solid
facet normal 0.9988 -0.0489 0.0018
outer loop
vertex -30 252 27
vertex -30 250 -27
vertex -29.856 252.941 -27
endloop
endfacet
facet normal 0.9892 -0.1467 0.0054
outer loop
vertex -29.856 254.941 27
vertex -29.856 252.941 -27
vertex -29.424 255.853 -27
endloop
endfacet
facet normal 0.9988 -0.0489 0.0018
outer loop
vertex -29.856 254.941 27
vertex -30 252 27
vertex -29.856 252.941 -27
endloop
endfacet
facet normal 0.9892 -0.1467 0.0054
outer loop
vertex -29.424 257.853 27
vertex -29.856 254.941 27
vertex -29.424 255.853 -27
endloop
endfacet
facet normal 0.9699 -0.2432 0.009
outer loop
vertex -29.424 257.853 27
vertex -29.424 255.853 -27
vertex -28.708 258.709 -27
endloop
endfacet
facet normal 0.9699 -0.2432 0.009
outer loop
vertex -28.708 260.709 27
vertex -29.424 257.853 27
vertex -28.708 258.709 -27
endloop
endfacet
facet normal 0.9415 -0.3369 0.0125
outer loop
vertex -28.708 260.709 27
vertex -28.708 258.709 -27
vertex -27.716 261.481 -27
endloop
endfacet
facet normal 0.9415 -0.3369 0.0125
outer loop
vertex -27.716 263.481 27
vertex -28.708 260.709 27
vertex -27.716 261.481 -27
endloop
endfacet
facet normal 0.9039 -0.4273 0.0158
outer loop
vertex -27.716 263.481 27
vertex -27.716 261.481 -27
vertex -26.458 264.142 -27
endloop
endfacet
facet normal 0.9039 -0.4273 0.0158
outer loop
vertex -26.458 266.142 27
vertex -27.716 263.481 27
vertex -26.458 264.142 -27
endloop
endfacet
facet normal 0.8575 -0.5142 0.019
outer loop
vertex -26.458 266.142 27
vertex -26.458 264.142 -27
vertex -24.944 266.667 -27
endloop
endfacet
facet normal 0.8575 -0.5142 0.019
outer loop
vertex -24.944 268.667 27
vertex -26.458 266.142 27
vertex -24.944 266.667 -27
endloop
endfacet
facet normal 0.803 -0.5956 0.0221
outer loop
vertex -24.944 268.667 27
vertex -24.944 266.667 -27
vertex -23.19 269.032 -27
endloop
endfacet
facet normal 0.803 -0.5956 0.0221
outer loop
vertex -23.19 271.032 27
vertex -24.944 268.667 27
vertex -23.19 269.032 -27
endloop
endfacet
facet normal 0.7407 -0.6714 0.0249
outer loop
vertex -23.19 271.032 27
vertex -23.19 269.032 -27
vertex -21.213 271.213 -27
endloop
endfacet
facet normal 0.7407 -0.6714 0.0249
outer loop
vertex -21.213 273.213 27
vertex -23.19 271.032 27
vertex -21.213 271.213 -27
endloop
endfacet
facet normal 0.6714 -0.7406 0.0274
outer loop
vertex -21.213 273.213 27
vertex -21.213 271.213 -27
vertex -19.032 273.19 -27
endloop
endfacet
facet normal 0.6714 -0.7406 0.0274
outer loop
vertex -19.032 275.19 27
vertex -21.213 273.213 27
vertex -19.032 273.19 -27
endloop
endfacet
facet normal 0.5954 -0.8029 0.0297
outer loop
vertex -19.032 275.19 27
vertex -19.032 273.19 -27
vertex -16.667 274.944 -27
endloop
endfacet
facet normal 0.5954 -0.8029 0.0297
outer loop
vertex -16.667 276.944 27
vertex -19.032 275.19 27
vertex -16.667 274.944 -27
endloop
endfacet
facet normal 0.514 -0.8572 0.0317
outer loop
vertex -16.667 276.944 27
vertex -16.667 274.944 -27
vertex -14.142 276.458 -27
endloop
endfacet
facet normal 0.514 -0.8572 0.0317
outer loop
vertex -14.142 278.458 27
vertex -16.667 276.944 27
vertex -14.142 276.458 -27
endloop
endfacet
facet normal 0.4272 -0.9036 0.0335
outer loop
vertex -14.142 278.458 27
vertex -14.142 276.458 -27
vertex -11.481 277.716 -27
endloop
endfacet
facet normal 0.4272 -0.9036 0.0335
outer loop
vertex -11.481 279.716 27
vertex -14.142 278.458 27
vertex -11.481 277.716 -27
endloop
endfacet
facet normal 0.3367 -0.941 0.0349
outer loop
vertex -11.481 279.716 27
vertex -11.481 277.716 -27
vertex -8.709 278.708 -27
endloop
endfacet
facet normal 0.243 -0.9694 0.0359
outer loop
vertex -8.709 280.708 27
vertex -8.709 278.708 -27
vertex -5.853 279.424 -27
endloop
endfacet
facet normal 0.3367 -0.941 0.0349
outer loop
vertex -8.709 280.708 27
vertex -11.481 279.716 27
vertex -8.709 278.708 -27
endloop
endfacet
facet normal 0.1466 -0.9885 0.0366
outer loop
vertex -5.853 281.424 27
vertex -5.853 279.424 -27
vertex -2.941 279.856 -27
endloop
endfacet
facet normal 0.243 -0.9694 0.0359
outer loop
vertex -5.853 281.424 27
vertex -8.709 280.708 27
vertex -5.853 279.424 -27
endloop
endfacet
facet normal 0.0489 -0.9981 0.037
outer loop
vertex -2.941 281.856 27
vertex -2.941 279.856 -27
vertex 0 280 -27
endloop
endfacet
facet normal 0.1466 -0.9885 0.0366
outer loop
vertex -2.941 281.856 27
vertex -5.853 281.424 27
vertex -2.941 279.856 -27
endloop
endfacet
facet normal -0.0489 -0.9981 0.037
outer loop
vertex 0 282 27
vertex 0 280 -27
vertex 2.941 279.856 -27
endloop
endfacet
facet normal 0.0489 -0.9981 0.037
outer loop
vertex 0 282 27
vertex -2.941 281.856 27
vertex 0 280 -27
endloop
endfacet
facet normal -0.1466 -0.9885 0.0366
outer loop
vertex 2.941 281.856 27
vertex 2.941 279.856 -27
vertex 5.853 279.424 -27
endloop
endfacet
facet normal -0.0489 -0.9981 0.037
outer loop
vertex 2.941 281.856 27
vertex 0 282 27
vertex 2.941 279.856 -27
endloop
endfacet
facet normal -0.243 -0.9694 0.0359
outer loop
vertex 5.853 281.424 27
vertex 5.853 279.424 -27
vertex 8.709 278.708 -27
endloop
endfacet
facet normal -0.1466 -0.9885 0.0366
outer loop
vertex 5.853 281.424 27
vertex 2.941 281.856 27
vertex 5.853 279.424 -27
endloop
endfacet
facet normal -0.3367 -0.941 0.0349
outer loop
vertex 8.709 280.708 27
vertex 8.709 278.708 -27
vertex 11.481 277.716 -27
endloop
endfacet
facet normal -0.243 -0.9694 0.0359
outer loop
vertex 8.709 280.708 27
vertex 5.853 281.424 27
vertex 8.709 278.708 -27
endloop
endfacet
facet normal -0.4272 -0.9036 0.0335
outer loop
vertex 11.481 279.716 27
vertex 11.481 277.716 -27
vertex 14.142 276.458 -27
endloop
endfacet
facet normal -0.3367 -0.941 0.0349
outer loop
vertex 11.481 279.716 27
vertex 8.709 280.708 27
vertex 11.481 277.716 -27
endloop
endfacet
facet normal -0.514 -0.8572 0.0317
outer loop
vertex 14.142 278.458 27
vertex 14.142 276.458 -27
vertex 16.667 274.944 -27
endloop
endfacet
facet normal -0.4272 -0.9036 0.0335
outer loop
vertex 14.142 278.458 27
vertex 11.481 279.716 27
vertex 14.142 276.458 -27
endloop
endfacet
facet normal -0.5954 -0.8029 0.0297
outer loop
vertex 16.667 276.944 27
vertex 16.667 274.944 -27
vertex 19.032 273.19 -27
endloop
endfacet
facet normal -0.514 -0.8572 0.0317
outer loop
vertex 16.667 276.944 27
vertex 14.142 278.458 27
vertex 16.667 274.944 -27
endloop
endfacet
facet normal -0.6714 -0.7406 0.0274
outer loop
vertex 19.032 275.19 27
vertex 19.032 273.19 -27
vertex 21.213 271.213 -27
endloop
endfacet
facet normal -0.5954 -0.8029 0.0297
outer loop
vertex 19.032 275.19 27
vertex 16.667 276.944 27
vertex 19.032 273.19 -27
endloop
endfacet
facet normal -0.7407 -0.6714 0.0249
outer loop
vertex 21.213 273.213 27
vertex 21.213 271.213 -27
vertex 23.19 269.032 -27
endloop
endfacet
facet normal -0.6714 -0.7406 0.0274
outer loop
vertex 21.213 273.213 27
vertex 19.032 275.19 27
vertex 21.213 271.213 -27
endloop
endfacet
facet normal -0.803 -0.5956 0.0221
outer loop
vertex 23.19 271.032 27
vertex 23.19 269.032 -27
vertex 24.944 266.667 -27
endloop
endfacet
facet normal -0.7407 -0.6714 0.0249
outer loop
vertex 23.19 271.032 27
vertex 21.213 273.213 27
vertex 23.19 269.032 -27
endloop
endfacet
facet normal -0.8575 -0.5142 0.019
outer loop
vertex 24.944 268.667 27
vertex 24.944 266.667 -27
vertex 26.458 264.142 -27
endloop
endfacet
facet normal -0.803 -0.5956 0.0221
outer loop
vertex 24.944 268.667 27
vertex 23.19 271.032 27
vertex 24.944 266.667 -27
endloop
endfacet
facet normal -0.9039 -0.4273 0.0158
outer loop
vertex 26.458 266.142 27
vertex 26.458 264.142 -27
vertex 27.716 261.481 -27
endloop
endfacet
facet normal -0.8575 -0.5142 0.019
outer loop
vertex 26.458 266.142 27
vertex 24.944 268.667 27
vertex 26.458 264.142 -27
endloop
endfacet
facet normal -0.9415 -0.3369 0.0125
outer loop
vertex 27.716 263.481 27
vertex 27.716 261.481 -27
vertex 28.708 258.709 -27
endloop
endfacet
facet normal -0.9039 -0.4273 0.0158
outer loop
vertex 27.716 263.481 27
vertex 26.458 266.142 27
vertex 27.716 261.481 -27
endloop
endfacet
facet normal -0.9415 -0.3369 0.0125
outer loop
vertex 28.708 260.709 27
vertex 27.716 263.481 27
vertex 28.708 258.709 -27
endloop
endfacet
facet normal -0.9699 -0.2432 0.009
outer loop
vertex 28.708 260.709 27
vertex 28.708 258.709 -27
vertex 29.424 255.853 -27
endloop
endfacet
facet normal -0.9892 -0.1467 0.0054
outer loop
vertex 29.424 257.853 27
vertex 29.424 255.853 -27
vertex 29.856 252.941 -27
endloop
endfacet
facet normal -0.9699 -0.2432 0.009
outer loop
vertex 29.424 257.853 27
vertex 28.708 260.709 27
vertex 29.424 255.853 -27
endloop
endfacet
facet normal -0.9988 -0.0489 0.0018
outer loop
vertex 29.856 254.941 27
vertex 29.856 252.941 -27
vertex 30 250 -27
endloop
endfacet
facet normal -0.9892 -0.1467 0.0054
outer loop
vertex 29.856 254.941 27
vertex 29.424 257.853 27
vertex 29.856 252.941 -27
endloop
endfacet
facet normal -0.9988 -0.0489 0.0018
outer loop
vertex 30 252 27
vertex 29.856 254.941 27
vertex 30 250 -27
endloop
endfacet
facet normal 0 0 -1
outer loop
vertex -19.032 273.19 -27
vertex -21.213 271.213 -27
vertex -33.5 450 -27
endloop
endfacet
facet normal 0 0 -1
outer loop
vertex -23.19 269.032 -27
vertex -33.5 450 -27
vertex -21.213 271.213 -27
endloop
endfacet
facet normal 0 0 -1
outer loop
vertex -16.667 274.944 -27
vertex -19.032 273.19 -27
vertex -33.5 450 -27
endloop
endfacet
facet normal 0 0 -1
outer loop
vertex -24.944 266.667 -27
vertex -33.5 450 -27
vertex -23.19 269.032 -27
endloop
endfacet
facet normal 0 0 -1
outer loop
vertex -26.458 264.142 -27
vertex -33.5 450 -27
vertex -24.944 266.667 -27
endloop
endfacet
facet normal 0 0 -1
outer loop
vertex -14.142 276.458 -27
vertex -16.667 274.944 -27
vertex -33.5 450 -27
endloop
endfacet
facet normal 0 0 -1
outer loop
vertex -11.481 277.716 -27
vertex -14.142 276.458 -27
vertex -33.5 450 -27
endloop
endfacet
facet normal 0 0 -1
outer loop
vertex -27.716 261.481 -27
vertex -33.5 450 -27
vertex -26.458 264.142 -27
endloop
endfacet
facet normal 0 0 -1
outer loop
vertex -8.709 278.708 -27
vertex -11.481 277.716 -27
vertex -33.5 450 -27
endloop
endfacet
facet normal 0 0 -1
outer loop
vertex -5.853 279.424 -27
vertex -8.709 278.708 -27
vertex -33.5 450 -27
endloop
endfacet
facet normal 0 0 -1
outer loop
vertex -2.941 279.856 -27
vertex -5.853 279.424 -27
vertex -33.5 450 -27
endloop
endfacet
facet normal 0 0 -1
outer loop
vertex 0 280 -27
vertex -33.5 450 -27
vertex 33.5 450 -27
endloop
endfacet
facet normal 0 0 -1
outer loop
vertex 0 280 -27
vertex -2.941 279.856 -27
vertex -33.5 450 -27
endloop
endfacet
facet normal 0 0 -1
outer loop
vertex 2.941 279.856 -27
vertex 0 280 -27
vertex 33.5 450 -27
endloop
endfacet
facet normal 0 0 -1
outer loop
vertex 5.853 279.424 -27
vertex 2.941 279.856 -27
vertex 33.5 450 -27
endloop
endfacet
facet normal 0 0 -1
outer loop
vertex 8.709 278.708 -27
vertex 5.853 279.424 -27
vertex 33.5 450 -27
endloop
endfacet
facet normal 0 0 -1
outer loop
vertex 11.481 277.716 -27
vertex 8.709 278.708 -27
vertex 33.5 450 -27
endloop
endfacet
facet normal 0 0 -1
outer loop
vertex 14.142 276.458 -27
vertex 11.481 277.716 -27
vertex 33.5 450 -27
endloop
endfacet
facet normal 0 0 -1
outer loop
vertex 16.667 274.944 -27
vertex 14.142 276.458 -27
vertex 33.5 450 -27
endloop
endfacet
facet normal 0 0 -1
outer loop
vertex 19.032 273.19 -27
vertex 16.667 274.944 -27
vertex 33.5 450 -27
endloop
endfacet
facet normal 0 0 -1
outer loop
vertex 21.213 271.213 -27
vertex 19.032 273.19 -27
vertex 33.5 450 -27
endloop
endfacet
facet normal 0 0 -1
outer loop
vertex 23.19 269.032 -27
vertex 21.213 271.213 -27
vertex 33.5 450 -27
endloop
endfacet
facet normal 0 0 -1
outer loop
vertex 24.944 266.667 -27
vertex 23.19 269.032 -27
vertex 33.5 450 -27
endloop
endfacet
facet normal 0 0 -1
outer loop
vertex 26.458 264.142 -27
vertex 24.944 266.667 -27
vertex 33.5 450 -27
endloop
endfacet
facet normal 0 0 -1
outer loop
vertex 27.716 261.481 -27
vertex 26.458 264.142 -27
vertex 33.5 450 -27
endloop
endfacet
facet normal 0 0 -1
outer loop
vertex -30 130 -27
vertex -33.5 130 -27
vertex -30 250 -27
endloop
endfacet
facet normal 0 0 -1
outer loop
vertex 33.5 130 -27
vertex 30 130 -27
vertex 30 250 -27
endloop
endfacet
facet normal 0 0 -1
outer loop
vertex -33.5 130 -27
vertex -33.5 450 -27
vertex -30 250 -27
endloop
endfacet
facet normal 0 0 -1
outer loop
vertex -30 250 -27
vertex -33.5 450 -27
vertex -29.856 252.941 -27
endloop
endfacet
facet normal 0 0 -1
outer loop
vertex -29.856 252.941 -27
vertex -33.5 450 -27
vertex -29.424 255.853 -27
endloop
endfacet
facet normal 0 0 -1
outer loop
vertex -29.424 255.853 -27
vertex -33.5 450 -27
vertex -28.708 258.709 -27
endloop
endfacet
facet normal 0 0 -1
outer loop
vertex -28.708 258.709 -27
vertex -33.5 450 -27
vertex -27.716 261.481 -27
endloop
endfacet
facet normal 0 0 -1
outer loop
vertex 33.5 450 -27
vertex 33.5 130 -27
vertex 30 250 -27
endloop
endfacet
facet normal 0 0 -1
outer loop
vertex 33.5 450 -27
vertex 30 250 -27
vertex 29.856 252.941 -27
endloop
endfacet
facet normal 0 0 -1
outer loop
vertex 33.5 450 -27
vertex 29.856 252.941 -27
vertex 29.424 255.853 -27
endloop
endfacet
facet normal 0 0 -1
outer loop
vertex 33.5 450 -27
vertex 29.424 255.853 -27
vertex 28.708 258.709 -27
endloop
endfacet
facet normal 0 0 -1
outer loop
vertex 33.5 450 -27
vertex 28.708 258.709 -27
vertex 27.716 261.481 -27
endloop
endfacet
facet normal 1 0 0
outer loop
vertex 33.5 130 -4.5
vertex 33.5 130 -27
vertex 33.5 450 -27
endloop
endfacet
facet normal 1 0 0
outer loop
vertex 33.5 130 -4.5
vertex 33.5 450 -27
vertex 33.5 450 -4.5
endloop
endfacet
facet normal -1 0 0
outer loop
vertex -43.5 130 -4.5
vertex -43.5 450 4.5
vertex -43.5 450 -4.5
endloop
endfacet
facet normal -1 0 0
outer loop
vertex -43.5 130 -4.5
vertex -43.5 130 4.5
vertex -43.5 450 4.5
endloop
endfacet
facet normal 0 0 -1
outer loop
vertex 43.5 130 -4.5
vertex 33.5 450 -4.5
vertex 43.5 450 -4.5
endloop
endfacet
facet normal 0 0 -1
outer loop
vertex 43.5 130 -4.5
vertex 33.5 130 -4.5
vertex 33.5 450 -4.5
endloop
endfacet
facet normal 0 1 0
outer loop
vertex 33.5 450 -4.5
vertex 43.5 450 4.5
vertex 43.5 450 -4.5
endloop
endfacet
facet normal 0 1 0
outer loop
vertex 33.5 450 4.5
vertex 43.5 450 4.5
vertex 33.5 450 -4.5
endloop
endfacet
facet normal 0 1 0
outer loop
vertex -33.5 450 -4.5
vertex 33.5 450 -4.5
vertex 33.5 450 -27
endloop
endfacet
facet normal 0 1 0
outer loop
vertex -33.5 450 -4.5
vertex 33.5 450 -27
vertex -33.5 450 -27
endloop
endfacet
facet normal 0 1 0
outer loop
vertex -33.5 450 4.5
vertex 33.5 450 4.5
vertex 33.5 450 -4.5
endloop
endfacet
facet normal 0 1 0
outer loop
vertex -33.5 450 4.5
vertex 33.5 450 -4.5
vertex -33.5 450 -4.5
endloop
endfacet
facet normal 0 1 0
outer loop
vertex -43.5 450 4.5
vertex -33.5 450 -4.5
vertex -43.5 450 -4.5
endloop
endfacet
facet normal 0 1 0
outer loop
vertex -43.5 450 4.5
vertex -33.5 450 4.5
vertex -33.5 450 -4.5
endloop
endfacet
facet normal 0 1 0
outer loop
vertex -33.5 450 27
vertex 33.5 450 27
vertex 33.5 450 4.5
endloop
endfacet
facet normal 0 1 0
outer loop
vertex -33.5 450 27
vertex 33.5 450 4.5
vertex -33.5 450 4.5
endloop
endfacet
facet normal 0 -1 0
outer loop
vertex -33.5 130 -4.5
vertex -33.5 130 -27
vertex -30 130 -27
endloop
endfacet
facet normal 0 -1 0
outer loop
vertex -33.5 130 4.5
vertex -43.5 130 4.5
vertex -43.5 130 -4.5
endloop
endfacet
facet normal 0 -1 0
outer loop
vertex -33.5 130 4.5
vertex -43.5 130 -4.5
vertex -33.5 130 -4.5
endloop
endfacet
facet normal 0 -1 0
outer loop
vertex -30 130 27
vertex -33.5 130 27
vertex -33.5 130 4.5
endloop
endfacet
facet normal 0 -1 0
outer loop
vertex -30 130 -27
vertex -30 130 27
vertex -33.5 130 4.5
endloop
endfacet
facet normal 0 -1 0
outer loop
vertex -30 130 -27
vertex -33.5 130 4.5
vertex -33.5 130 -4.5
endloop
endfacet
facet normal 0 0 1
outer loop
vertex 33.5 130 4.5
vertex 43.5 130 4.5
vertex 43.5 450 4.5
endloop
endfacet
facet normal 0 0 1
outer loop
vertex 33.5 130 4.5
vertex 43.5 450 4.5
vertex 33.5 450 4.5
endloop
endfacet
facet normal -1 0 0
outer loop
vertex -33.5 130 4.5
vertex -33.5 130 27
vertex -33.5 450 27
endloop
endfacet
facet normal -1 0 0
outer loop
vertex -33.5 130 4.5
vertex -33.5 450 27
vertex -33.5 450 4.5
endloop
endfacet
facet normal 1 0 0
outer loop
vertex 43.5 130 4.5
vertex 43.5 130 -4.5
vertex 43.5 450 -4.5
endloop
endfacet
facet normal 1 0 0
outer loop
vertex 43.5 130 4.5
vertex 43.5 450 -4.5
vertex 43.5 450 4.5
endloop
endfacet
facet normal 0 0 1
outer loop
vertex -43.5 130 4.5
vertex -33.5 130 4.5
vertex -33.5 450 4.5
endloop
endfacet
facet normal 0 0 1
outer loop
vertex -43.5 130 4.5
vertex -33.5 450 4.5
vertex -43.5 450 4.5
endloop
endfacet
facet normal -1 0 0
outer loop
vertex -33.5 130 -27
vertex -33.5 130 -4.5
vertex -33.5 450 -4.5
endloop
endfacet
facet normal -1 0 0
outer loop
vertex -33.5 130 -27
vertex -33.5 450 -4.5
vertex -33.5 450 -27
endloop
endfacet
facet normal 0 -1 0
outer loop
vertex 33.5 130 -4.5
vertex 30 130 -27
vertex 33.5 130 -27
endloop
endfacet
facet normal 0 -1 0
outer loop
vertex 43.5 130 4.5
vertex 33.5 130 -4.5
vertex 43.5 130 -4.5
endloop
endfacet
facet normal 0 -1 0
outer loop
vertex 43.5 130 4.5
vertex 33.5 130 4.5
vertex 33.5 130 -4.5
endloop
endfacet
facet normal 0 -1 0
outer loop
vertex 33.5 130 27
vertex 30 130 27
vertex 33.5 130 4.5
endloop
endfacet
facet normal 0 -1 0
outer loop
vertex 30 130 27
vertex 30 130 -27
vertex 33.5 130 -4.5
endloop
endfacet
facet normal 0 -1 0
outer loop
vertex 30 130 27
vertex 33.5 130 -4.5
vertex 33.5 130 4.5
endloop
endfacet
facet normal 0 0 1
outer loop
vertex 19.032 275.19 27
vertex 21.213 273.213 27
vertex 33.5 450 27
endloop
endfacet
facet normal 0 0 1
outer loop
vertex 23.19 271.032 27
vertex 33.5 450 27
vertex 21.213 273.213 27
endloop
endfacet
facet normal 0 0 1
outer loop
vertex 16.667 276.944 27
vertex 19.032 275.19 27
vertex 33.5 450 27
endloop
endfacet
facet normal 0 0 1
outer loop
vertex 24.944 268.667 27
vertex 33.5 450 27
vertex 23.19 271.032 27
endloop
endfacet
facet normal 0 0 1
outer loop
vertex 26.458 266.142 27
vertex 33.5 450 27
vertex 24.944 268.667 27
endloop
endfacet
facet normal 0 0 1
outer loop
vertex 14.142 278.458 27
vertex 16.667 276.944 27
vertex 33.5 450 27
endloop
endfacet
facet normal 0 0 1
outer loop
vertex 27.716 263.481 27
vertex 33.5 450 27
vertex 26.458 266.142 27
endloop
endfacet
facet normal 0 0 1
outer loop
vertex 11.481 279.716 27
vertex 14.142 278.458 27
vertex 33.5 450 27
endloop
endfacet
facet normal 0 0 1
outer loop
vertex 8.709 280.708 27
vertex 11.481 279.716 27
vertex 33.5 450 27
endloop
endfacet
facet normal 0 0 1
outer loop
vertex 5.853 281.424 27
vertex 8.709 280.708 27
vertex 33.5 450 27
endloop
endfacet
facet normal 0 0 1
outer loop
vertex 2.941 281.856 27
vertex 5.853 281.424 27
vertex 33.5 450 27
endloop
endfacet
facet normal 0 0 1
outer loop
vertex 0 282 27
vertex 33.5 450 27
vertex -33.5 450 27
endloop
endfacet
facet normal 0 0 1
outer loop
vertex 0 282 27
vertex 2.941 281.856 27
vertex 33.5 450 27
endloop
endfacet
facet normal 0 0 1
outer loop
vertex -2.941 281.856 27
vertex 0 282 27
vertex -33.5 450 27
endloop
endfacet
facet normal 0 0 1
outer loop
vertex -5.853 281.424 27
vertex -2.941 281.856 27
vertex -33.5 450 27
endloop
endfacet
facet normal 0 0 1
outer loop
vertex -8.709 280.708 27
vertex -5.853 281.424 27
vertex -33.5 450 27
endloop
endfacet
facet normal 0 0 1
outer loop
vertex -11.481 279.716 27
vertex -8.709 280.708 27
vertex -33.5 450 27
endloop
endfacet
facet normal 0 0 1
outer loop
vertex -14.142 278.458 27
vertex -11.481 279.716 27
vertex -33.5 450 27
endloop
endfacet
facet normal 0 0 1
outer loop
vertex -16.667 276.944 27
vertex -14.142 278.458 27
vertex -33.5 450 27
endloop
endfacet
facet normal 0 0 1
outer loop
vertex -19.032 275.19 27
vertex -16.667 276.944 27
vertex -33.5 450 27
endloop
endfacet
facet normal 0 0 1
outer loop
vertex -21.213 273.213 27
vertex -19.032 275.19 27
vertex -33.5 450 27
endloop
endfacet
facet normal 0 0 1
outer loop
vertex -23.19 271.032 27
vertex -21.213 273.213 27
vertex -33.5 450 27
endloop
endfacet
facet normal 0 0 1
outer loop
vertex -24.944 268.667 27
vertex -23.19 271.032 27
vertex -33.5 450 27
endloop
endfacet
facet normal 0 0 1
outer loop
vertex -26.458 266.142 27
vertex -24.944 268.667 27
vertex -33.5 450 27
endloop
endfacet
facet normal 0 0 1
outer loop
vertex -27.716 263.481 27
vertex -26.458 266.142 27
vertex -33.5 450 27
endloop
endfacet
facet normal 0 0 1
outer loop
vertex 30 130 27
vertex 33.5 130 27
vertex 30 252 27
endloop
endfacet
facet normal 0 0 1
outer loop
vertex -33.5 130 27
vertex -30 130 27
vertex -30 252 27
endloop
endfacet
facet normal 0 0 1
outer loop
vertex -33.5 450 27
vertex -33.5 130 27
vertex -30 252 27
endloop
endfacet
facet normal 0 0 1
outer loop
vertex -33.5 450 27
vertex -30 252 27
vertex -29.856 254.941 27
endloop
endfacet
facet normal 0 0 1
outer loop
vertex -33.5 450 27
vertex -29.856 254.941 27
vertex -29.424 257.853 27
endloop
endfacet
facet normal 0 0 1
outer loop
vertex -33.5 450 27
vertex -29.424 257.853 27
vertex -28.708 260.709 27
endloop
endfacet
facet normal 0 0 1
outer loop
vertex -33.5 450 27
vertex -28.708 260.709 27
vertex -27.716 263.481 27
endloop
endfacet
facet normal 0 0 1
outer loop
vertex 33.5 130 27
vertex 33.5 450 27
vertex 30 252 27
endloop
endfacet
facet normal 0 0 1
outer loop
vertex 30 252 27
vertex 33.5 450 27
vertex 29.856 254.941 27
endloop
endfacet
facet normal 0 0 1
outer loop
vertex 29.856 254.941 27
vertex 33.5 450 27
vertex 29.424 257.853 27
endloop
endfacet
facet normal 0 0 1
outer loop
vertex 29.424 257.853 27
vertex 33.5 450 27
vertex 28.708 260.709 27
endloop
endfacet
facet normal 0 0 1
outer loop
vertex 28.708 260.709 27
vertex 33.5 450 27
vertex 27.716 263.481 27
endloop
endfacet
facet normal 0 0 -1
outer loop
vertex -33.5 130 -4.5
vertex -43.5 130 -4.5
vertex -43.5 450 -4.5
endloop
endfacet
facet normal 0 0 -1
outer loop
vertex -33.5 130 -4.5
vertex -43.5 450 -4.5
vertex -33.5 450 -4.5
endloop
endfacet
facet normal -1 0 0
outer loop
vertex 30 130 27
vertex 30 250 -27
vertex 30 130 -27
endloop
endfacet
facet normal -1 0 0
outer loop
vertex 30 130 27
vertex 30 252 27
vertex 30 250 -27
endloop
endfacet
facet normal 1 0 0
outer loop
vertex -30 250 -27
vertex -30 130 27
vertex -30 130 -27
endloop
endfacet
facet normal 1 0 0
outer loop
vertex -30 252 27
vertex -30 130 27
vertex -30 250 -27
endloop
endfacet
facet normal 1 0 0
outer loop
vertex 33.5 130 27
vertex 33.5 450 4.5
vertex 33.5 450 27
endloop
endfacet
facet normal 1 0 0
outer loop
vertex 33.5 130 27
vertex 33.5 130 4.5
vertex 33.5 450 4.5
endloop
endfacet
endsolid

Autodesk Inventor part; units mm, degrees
ref_plane "YZ Plane" through (0, 0, 0) normal (1, 0, 0) x (0, 1, 0)
ref_plane "XZ Plane" through (0, 0, 0) normal (0, 1, 0) x (-1, 0, 0)
ref_plane "XY Plane" through (0, 0, 0) normal (0, 0, 1) x (1, 0, 0)
sketch "草圖1" plane through (0, 0, 0) normal (0, 1, 0) x (-1, 0, 0)
  line L0 (-33.5, 27) -> (33.5, 27)
  line L1 (33.5, 27) -> (33.5, -27)
  line L2 (33.5, -27) -> (-33.5, -27)
  line L3 (-33.5, -27) -> (-33.5, 27)
  line L4 (-33.5, 27) -> (33.5, -27) construction
  line L5 (33.5, 27) -> (-33.5, -27) construction
  line L6 (43.5, -4.5) -> (33.5, -4.5)
  line L7 (33.5, -4.5) -> (33.5, 4.5)
  line L8 (33.5, 4.5) -> (43.5, 4.5)
  line L9 (43.5, 4.5) -> (43.5, -4.5)
  line L10 (-33.5, -4.5) -> (-43.5, -4.5)
  line L11 (-43.5, -4.5) -> (-43.5, 4.5)
  line L12 (-43.5, 4.5) -> (-33.5, 4.5)
  line L13 (-33.5, 4.5) -> (-33.5, -4.5)
  point P0 (0, 0)
  point P1 (33.5, 0)
  point P2 (-33.5, 0)
  point P3 (-33.5, 4.5)
  point P4 (-33.5, -4.5)
  dimension "d0" = 67
  dimension "d1" = 54
  dimension "d2" = 9
  dimension "d3" = 10
extrude "擠出1" add sketch "草圖1" along normal blind 450
sketch "草圖2" plane through (-33.5, 0, 27) normal (0, 0, 1) x (1, 0, 0)
  line L0 (0, 0) -> (0, 450) projected
  line L1 (0, 450) -> (67, 450) projected
  line L2 (67, 450) -> (67, 0) projected
  line L3 (67, 0) -> (0, 0) projected
  circle A0 centre (33.5, 222) radius 30
  line L4 (3.5, 222) -> (63.5, 222)
  line L5 (63.5, 222) -> (63.5, -38.0593)
  line L6 (63.5, -38.0593) -> (3.5, -38.0593)
  line L7 (3.5, -38.0593) -> (3.5, 222)
  point P0 (33.5, 0)
  point P1 (33.5, 0)
  dimension "d6" = 222
  dimension "d7" = 60
extrude "擠出2" cut sketch "草圖2" against normal through all contours L7 A0 L5 L3 | L3 L5 L6 L7 | L4 A0 | A0 L4
sketch "草圖3" plane through (-33.5, 450, 27) normal (0, 0, 1) x (1, 0, 0)
  line L0 (-67.0384, -320) -> (134.0384, -320)
  line L1 (134.0384, -320) -> (134.0384, -450)
  line L2 (134.0384, -450) -> (-67.0384, -450)
  line L3 (-67.0384, -450) -> (-67.0384, -320)
  point P0 (33.5, -450)
  point P1 (33.5, -450)
  dimension "d10" = 130
extrude "擠出3" cut sketch "草圖3" against normal through all
sketch "草圖4" plane through (33.5, 450, -27) normal (0, 0, -1) x (-1, 0, 0)
  circle A0 centre (33.5, -200) radius 30
  arc A1 (63.5, -228) -> (3.5, -228) centre (33.5, -228) ccw construction
  line L0 (63.5, -320) -> (3.5, -320)
  line L1 (3.5, -320) -> (3.5, -200)
  line L2 (3.5, -200) -> (63.5, -200)
  line L3 (63.5, -200) -> (63.5, -320)
  point P0 (33.5, -450)
  point P1 (63.5, -320)
  dimension "d13" = 28
  dimension "d14" = 60
sketch "草圖5" plane through (-33.5, 450, 27) normal (0, 0, 1) x (1, 0, 0)
  circle A0 centre (33.5, -198) radius 30
  arc A1 (63.5, -228) -> (3.5, -228) centre (33.5, -228) ccw construction
  line L0 (63.5, -320) -> (3.5, -320)
  line L1 (3.5, -320) -> (3.5, -198)
  line L2 (3.5, -198) -> (63.5, -198)
  line L3 (63.5, -198) -> (63.5, -320)
  point P0 (33.5, -450)
  point P1 (63.5, -320)
  dimension "d15" = 30
  dimension "d16" = 60
loft "斷面混成1" cut profiles "草圖4", "草圖5"
properties part number "Slider-8"
